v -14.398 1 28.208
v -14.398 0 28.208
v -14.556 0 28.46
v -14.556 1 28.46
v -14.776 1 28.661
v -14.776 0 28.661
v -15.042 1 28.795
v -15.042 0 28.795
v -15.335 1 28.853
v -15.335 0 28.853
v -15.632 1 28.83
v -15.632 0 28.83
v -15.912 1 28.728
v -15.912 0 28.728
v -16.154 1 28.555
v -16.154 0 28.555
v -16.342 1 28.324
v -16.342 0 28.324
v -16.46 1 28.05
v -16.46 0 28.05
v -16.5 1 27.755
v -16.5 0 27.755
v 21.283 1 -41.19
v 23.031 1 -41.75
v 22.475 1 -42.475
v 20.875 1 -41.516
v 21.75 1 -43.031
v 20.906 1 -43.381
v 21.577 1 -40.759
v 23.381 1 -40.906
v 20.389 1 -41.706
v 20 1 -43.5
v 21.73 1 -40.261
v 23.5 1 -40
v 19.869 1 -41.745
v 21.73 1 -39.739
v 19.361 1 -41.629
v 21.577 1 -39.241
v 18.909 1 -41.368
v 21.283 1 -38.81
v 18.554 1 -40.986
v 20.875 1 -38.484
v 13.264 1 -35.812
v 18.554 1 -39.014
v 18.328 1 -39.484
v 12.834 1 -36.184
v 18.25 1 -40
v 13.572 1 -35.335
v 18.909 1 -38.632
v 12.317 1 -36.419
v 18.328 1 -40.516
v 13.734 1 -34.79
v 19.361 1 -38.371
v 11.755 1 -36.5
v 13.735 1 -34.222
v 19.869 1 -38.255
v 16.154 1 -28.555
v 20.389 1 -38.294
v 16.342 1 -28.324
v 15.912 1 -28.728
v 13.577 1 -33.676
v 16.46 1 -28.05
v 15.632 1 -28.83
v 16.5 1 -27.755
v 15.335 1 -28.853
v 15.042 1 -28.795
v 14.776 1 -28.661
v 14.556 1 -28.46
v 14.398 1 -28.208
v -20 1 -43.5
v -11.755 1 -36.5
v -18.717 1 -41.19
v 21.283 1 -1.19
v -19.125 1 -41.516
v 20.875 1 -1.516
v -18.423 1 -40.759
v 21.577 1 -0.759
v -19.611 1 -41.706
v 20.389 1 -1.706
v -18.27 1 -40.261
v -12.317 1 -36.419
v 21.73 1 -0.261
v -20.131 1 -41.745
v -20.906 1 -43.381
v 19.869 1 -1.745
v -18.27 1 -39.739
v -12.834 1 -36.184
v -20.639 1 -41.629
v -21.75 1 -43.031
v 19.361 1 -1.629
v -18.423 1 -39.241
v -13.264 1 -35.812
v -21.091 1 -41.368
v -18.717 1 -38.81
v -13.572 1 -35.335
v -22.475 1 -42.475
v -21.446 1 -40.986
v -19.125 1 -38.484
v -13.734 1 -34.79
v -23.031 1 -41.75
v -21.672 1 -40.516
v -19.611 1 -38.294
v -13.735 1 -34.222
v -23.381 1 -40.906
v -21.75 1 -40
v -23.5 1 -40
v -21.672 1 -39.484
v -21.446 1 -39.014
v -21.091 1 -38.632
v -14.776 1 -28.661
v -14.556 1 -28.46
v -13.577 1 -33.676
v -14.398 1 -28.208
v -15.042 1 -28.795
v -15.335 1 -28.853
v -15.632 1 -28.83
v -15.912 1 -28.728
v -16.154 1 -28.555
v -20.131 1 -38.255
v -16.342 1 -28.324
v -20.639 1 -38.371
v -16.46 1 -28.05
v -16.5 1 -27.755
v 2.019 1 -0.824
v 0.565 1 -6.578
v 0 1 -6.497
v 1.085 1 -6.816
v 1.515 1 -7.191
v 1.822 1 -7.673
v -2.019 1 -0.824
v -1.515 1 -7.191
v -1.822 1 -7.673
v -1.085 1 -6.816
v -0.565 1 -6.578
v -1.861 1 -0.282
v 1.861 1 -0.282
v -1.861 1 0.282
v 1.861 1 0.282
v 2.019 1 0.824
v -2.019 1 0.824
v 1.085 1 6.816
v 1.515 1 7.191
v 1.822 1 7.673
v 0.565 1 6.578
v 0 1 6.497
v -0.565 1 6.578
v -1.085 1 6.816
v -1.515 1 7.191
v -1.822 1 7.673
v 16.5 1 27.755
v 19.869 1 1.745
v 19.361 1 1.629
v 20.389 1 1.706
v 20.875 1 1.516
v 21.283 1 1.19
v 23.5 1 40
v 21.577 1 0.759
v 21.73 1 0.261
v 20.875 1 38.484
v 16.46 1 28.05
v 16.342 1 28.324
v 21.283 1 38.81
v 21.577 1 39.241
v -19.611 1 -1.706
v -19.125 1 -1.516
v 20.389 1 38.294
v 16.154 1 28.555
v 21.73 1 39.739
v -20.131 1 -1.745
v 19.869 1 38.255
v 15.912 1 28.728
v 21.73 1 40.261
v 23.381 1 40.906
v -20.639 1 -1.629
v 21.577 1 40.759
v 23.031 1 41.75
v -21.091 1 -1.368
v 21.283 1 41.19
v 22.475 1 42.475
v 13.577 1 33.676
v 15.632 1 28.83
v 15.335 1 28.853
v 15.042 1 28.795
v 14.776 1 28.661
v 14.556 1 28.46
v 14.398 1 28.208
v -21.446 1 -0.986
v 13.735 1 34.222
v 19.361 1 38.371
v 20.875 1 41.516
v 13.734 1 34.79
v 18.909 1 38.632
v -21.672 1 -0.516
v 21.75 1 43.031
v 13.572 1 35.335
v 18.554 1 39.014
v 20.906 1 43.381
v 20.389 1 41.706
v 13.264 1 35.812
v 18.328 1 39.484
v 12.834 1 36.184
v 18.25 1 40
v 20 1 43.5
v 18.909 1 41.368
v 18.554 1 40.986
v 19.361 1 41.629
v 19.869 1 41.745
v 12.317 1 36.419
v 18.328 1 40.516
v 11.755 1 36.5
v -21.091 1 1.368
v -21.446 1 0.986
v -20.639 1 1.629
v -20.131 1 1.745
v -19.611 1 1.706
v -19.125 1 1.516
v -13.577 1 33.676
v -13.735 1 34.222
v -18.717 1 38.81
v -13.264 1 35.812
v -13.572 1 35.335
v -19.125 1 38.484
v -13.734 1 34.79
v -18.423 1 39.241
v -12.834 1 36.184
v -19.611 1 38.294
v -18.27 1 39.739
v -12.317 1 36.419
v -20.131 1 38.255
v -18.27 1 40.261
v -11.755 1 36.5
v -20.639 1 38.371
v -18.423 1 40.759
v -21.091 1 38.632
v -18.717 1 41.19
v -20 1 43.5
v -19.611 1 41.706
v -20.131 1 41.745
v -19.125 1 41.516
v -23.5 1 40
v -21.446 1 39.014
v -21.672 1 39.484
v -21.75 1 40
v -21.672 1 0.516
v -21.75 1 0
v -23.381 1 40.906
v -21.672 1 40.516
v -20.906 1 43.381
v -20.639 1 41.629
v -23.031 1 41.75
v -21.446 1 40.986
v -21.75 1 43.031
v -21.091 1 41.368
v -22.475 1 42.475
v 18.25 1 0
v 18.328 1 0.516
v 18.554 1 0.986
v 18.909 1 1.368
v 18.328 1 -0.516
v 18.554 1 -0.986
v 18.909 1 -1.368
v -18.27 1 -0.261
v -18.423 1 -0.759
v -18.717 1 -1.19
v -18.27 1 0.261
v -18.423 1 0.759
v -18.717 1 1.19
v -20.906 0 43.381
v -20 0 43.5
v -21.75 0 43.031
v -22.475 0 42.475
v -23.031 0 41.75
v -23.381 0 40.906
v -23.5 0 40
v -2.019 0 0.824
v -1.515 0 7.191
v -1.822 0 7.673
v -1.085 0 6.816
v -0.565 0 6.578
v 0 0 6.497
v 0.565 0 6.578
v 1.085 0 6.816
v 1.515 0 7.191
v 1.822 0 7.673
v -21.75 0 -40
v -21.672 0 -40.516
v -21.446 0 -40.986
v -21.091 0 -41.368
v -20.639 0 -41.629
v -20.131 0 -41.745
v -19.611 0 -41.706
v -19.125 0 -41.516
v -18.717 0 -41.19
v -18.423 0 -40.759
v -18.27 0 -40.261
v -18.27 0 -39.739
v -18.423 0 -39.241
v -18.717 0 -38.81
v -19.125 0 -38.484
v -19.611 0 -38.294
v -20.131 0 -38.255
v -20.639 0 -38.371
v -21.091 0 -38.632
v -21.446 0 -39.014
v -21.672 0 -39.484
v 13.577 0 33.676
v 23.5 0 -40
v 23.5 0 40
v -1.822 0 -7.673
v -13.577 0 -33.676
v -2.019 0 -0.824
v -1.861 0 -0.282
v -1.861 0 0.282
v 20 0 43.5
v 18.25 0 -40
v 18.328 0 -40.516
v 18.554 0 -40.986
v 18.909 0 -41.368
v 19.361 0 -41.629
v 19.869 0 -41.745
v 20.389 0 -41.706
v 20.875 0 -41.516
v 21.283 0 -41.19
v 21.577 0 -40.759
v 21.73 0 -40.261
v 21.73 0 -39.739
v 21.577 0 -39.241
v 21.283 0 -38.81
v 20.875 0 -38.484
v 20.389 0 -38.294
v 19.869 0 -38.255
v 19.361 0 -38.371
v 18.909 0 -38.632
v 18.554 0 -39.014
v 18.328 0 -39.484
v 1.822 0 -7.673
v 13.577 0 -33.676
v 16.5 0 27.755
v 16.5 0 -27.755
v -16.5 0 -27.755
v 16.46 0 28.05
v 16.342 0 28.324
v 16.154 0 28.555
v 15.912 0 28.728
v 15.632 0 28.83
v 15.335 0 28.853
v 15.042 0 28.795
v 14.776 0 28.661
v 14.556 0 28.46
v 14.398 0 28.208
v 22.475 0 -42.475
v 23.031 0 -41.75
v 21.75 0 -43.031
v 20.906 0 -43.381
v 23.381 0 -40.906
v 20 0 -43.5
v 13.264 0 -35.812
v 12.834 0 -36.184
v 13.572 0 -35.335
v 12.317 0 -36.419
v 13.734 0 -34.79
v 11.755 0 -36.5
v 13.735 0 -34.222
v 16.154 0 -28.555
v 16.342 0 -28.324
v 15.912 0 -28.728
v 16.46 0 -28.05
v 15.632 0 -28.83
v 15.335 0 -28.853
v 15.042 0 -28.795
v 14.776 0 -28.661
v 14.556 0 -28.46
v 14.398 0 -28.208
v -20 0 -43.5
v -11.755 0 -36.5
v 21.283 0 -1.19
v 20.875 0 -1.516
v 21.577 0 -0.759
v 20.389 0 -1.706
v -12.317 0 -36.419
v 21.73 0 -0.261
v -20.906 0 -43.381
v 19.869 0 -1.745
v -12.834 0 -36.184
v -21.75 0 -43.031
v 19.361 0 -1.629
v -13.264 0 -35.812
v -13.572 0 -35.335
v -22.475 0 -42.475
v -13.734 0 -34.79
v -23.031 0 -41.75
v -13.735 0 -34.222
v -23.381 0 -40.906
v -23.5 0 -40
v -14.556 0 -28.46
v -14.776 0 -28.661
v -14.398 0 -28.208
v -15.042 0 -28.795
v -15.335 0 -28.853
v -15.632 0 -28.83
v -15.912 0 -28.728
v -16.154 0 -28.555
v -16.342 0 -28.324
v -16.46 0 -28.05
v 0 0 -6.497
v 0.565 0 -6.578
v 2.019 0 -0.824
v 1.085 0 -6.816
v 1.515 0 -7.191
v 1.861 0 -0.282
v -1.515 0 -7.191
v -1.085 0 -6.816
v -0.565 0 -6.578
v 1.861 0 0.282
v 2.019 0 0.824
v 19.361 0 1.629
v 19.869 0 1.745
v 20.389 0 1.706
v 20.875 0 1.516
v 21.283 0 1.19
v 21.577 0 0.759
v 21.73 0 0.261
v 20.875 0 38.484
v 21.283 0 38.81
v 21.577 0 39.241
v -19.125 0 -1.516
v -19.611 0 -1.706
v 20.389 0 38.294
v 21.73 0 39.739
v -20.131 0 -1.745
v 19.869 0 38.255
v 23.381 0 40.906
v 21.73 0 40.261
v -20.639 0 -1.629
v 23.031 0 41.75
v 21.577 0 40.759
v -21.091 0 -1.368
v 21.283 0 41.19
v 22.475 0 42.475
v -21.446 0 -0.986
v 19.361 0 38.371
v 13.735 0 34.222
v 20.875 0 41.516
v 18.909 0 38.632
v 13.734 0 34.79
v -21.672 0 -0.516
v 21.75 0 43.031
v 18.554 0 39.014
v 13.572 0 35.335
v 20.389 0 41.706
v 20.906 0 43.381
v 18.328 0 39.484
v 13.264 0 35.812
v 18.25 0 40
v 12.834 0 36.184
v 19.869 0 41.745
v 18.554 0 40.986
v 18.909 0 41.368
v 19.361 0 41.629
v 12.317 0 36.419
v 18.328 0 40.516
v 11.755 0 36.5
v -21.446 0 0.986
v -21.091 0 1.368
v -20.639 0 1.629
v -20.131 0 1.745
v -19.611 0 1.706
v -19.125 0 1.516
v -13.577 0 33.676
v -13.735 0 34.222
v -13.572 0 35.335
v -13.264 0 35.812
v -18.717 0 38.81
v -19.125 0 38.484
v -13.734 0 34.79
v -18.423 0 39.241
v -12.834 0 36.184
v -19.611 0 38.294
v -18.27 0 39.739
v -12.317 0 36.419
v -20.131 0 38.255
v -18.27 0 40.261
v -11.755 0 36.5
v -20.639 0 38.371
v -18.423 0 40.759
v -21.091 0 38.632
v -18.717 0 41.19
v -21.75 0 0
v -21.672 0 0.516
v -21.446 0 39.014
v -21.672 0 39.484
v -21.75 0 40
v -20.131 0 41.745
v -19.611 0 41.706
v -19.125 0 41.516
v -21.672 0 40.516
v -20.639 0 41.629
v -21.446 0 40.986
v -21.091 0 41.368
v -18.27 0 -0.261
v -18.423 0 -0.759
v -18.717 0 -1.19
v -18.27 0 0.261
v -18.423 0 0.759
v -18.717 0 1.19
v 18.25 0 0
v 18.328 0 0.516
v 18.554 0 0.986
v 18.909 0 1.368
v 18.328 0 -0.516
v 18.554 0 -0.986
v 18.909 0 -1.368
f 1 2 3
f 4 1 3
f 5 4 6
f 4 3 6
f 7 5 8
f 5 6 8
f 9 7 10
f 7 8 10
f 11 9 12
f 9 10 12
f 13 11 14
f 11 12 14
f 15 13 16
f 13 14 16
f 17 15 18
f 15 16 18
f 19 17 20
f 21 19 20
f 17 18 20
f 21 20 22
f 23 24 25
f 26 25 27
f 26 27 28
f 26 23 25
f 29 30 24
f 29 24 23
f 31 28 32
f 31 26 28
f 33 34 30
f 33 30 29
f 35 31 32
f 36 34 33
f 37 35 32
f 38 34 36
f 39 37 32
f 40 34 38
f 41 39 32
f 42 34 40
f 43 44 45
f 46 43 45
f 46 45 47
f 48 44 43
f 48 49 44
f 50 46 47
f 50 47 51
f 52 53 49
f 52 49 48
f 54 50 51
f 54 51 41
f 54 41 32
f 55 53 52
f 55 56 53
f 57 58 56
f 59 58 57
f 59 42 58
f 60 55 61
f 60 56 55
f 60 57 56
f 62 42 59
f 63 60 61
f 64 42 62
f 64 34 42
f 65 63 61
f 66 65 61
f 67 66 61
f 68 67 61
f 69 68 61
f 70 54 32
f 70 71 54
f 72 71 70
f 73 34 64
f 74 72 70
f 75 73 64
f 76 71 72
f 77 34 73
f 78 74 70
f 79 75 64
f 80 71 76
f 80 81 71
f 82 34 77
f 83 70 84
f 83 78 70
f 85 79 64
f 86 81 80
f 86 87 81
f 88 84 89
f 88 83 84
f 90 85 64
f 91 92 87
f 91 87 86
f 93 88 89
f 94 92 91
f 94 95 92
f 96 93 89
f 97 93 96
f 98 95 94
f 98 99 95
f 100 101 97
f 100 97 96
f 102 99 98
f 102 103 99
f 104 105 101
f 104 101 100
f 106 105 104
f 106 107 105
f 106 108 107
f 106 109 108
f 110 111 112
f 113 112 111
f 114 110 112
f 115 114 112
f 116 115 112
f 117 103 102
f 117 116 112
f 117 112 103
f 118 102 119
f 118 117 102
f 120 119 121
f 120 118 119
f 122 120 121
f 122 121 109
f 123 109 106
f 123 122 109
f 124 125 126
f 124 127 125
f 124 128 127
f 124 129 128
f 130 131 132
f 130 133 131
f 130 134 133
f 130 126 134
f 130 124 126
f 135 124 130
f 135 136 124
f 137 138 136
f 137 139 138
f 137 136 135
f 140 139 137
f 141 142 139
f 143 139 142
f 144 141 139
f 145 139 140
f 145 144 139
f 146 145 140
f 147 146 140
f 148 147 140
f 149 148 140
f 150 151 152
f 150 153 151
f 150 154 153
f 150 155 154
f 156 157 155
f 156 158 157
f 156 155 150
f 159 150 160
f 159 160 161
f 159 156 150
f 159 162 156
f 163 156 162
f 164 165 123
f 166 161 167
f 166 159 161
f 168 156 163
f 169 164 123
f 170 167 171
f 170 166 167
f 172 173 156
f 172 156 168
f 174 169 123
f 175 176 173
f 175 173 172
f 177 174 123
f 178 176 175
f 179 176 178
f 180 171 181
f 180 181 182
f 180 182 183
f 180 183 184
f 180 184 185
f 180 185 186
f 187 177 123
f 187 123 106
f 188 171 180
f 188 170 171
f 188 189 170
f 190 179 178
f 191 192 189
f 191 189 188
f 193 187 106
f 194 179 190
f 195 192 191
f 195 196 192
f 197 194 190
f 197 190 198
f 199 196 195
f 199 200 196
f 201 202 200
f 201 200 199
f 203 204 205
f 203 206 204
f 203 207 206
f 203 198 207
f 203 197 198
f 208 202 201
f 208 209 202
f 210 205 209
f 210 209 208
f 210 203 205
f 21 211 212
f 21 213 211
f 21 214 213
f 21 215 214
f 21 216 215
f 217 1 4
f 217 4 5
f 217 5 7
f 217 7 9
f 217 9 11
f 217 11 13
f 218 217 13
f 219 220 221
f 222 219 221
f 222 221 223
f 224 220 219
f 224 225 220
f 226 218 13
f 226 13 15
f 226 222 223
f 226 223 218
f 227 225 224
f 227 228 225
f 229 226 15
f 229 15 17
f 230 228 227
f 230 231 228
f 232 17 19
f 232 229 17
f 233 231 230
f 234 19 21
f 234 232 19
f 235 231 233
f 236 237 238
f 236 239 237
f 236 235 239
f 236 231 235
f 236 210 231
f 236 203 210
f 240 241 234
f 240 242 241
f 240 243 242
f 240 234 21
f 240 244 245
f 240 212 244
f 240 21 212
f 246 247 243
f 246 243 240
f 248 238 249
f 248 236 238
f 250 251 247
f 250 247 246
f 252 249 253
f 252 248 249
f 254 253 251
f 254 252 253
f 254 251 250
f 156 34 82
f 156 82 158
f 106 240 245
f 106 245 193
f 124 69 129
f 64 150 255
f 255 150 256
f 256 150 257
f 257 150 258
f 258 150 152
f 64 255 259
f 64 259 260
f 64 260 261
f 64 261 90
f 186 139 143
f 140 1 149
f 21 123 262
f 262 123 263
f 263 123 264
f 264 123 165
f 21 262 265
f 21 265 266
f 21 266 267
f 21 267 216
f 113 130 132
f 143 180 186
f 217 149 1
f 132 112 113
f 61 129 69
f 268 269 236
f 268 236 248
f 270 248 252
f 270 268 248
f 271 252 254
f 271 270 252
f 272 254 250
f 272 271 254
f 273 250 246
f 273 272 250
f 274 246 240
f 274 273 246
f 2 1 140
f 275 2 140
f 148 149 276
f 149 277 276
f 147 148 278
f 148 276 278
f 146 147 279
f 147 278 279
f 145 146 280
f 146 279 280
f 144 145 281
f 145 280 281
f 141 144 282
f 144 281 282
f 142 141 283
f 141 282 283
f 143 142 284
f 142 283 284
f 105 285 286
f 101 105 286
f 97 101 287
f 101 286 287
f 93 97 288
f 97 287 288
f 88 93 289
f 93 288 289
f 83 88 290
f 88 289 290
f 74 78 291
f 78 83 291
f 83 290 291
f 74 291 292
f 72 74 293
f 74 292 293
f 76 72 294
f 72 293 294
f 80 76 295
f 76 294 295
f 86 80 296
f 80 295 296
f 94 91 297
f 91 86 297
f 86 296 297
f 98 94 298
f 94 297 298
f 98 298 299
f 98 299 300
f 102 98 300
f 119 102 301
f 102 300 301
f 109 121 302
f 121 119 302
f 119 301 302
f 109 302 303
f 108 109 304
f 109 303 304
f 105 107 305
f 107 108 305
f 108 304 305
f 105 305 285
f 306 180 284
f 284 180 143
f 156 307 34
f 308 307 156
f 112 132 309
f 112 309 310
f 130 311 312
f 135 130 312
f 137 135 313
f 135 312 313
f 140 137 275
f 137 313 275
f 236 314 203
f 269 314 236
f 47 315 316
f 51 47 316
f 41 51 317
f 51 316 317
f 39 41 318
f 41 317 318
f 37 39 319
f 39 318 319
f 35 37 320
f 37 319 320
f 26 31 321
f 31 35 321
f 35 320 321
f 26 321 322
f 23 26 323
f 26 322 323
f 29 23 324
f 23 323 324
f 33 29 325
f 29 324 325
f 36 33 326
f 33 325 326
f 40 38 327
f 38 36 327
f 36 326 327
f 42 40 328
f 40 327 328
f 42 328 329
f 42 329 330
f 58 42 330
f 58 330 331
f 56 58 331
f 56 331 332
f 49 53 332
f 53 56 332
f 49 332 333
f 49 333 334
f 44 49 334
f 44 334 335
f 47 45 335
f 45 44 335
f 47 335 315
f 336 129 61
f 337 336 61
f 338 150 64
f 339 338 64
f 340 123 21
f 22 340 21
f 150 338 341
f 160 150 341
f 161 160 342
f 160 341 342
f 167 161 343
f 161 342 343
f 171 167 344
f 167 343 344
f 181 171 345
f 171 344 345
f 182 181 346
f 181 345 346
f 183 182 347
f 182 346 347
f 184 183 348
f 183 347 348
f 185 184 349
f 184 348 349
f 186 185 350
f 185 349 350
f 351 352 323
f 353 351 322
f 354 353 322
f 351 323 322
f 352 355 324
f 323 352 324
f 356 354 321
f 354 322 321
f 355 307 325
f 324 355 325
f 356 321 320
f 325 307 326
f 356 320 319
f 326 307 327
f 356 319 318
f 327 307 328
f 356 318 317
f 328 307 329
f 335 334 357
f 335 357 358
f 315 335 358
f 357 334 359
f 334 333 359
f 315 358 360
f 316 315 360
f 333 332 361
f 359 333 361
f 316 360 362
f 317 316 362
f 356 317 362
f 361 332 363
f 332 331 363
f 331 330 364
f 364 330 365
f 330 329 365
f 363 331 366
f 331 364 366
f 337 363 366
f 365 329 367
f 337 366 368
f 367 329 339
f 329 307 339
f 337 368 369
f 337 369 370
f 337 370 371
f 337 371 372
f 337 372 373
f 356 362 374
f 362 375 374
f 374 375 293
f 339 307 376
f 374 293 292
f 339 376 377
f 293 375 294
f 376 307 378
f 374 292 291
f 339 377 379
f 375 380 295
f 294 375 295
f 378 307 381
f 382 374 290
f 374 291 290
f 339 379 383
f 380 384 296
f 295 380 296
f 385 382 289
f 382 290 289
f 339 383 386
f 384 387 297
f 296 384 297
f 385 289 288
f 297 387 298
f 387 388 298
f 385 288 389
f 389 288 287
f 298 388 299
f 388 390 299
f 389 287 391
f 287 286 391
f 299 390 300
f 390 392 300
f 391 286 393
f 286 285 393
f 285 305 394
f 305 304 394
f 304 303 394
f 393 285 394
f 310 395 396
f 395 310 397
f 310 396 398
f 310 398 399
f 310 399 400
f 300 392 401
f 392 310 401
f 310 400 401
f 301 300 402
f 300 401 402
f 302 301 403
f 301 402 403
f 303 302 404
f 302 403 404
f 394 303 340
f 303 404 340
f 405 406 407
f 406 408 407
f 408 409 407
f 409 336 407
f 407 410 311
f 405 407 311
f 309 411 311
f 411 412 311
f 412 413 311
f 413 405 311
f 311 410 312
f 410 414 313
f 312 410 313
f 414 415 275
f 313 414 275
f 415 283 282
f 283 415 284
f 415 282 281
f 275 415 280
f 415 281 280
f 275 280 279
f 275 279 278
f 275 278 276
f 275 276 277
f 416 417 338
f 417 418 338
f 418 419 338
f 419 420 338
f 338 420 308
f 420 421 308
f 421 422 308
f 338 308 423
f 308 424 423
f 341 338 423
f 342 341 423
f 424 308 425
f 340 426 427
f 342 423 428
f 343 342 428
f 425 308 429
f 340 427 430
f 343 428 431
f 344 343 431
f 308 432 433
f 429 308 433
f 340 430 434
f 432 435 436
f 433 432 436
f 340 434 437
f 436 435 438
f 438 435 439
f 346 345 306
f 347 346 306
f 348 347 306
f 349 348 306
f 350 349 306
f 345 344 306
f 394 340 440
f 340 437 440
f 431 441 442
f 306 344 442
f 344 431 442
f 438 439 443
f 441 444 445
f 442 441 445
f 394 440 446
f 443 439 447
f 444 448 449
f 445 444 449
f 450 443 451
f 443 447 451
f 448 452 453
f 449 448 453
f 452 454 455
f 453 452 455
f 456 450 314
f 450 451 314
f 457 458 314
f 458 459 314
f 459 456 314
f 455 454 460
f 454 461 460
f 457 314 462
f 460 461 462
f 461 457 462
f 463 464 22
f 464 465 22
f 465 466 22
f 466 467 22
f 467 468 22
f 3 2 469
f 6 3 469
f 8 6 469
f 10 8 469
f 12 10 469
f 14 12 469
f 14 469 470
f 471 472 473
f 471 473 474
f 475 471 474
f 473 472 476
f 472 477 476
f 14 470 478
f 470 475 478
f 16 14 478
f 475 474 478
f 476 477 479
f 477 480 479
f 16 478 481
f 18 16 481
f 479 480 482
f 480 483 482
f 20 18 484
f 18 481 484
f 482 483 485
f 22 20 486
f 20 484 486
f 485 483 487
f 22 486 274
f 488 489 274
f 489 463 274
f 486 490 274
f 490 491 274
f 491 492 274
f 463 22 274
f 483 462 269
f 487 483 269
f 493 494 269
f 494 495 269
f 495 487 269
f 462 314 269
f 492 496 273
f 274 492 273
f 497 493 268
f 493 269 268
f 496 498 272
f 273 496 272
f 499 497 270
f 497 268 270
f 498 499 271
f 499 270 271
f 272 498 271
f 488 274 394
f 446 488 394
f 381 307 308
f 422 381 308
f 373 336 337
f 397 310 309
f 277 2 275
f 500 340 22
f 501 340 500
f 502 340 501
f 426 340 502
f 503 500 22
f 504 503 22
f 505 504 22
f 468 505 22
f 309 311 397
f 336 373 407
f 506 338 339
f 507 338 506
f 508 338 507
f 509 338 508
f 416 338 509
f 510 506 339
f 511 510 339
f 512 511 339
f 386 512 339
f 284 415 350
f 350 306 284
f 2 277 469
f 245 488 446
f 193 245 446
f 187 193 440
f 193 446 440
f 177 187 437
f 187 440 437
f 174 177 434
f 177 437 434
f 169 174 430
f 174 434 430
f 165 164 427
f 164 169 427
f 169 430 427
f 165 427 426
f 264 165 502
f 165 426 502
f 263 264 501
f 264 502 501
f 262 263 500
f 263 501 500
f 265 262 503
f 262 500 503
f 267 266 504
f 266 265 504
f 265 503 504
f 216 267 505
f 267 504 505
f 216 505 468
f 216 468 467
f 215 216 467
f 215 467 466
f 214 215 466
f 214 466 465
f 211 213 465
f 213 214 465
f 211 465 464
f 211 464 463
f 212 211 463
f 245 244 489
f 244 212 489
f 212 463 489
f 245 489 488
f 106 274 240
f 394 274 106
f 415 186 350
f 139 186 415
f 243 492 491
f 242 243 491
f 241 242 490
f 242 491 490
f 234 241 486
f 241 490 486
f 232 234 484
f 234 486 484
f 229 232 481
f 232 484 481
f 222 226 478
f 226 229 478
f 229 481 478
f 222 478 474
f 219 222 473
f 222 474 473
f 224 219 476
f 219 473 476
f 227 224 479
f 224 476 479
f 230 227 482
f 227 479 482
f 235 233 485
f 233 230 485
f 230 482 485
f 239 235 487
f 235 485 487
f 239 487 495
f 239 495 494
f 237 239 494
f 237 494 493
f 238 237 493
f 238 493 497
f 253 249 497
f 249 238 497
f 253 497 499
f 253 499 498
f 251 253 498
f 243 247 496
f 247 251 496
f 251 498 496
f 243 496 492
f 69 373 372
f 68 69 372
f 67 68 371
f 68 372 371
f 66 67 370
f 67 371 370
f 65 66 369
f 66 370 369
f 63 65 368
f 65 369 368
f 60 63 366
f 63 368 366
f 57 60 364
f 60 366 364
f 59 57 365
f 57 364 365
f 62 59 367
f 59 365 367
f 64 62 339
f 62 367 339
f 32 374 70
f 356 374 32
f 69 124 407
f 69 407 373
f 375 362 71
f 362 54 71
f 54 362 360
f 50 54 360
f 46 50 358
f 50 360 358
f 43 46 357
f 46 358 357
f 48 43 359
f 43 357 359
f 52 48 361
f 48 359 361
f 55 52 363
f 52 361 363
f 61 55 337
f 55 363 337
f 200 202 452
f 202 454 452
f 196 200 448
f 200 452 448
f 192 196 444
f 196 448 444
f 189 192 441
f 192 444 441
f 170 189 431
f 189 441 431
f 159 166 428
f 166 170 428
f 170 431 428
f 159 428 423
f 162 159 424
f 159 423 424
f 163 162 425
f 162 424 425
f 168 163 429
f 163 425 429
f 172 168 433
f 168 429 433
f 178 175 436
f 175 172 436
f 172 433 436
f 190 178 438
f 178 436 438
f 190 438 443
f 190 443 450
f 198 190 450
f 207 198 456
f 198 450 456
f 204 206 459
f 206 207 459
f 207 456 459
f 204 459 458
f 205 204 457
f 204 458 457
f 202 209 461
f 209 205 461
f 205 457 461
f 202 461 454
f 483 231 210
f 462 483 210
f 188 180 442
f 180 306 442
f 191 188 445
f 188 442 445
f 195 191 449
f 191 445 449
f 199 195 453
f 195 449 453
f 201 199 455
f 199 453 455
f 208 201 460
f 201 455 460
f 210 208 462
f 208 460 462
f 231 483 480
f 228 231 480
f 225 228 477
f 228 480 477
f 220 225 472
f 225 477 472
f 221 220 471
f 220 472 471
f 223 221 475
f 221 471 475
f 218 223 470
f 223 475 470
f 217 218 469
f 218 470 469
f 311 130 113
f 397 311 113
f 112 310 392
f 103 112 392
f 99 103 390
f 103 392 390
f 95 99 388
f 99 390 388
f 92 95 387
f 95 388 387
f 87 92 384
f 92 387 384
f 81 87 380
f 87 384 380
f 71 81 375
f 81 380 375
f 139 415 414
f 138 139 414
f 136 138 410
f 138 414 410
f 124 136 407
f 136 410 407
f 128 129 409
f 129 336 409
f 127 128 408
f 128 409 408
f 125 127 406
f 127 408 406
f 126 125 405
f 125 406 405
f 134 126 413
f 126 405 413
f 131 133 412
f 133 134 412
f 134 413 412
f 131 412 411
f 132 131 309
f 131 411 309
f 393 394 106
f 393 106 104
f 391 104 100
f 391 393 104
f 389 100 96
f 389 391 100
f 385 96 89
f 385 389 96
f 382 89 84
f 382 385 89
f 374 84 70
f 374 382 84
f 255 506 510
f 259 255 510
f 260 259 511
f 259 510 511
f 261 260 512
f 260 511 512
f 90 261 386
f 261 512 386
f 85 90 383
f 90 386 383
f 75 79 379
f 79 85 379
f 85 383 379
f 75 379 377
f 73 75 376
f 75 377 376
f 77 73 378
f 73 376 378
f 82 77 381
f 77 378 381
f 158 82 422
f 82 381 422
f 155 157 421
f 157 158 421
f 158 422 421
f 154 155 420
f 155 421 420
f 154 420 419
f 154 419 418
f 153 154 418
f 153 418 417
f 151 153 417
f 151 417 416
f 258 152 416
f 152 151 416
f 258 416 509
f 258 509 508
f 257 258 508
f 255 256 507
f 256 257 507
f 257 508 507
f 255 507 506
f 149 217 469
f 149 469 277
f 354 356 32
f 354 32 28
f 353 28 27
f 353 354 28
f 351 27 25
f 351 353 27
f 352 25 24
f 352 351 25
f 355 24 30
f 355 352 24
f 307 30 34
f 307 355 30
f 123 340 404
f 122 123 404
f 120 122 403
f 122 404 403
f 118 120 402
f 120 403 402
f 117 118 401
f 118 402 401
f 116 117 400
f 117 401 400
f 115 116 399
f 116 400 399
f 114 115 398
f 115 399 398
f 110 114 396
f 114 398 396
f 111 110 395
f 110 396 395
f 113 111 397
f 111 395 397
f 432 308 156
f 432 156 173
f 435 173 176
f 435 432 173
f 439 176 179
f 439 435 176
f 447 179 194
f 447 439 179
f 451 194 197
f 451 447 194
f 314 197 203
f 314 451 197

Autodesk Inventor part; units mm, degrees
ref_plane "YZ Plane" through (0, 0, 0) normal (1, 0, 0) x (0, 1, 0)
ref_plane "XZ Plane" through (0, 0, 0) normal (0, 1, 0) x (-1, 0, 0)
ref_plane "XY Plane" through (0, 0, 0) normal (0, 0, 1) x (1, 0, 0)
sketch "Sketch1" plane through (0, 0, 0) normal (0, 1, 0) x (-1, 0, 0)
  line L0 (-20, 40) -> (20, 40) construction
  line L1 (20, 40) -> (20, -40) construction
  line L2 (20, -40) -> (-20, -40) construction
  line L3 (-20, -40) -> (-20, 40) construction
  line L4 (-20, 40) -> (20, -40) construction
  line L5 (20, 40) -> (-20, -40) construction
  circle A0 centre (20, 40) radius 1.75
  circle A1 centre (20, -40) radius 1.75
  circle A2 centre (-20, -40) radius 1.75
  circle A3 centre (-20, 40) radius 1.75
  circle A4 centre (20, 0) radius 1.75
  circle A5 centre (-20, 0) radius 1.75
  line L6 (-20, 43.5) -> (20, 43.5)
  line L7 (23.5, 40) -> (23.5, -40)
  line L8 (20, -43.5) -> (-20, -43.5)
  line L9 (-23.5, -40) -> (-23.5, 40)
  line L10 (-23.5, 43.5) -> (23.5, -43.5) construction
  line L11 (23.5, 43.5) -> (-23.5, -43.5) construction
  arc A6 (23.5, 40) -> (20, 43.5) centre (20, 40) ccw
  arc A7 (-20, 43.5) -> (-23.5, 40) centre (-20, 40) ccw
  arc A8 (-23.5, -40) -> (-20, -43.5) centre (-20, -40) ccw
  arc A9 (20, -43.5) -> (23.5, -40) centre (20, -40) ccw
  point P0 (0, 0)
  dimension "d0" = 40
  dimension "d1" = 80
  dimension "d2" = 3.5
  dimension "d3" = 3.5
  dimension "d4" = 3.5
  dimension "d5" = 3.5
  dimension "d6" = 3.5
  dimension "d7" = 3.5
  dimension "d8" = 47
  dimension "d9" = 87
  dimension "d10" = 3.5
extrude "Extrusion1" add sketch "Sketch1" along normal blind 1
sketch "Sketch2" plane through (0, 1, 0) normal (0, 1, 0) x (1, 0, 0)
  line L0 (-16.5, -36.5) -> (16.5, -36.5)
  line L1 (16.5, -36.5) -> (16.5, 36.5)
  line L2 (16.5, 36.5) -> (-16.5, 36.5)
  line L3 (-16.5, 36.5) -> (-16.5, -36.5)
  line L4 (-16.5, -36.5) -> (16.5, 36.5)
  line L5 (16.5, -36.5) -> (-16.5, 36.5)
  line L6 (15.1332, -37.1179) -> (-17.8668, 35.8821)
  line L7 (17.8668, -35.8821) -> (-15.1332, 37.1179)
  line L8 (-17.8668, -35.8821) -> (15.1332, 37.1179)
  line L9 (-15.1332, -37.1179) -> (17.8668, 35.8821)
  point P0 (0, 0)
  point P1 (16.5, 32.8585)
  point P2 (1.6461, 0)
  point P3 (16.5, -32.8585)
  point P4 (0, 3.6415)
  point P5 (14.8539, 36.5)
  point P6 (-14.8539, 36.5)
  point P7 (0, -3.6415)
  point P8 (-14.8539, -36.5)
  point P9 (14.8539, -36.5)
  point P10 (-16.5, -32.8585)
  point P11 (-1.6461, 0)
  point P12 (-16.5, 32.8585)
  dimension "d13" = 33
  dimension "d14" = 73
  dimension "d15" = 1.5
  dimension "d16" = 1.5
  dimension "d17" = 1.5
  dimension "d18" = 1.5
extrude "Extrusion2" cut sketch "Sketch2" against normal through all contours L9 L6 L0 | L3 L6 L8 | L7 L9 L1 | L2 L8 L7
fillet "Fillet1" radius 2 8 edges at (-14.8539, 0.5, 36.5) (14.8539, 0.5, 36.5) (-14.8539, 0.5, -36.5) (14.8539, 0.5, -36.5) (1.6461, 0.5, 0) (-1.6461, 0.5, 0) (0, 0.5, 3.6415) (0, 0.5, -3.6415)
fillet "Fillet2" radius 1.1 4 edges at (16.5, 0.5, 32.8585) (-16.5, 0.5, 32.8585) (-16.5, 0.5, -32.8585) (16.5, 0.5, -32.8585)
equation "\"d11\" = ThicknessBatteryTopTray"
equation "\"MountToMotorCenter\" = 0"
equation "\"ArmPosition\" = 5deg"
equation "\"BatteryWidth\" = 62"
equation "\"BatteryHeight\" = 76"
equation "\"ThicknessBodyOuterPlate\" = 2"
equation "\"ThicknessBodyCenterPlate\" = 2"
equation "\"ThicknessLegLoadpipePlate\" = 2"
equation "\"ThicknessBatteryTray\" = 2"
equation "\"ThicknessBatteryTopTray\" = 1"
equation "\"LandingGearStabilityBar\" = 525"
equation "\"StartAngleArm\" = 45deg"
equation "\"MotorMountCenter\" = 71.5"
properties part number "Tattu_Battery__Top_Tray" material "CFRP"
